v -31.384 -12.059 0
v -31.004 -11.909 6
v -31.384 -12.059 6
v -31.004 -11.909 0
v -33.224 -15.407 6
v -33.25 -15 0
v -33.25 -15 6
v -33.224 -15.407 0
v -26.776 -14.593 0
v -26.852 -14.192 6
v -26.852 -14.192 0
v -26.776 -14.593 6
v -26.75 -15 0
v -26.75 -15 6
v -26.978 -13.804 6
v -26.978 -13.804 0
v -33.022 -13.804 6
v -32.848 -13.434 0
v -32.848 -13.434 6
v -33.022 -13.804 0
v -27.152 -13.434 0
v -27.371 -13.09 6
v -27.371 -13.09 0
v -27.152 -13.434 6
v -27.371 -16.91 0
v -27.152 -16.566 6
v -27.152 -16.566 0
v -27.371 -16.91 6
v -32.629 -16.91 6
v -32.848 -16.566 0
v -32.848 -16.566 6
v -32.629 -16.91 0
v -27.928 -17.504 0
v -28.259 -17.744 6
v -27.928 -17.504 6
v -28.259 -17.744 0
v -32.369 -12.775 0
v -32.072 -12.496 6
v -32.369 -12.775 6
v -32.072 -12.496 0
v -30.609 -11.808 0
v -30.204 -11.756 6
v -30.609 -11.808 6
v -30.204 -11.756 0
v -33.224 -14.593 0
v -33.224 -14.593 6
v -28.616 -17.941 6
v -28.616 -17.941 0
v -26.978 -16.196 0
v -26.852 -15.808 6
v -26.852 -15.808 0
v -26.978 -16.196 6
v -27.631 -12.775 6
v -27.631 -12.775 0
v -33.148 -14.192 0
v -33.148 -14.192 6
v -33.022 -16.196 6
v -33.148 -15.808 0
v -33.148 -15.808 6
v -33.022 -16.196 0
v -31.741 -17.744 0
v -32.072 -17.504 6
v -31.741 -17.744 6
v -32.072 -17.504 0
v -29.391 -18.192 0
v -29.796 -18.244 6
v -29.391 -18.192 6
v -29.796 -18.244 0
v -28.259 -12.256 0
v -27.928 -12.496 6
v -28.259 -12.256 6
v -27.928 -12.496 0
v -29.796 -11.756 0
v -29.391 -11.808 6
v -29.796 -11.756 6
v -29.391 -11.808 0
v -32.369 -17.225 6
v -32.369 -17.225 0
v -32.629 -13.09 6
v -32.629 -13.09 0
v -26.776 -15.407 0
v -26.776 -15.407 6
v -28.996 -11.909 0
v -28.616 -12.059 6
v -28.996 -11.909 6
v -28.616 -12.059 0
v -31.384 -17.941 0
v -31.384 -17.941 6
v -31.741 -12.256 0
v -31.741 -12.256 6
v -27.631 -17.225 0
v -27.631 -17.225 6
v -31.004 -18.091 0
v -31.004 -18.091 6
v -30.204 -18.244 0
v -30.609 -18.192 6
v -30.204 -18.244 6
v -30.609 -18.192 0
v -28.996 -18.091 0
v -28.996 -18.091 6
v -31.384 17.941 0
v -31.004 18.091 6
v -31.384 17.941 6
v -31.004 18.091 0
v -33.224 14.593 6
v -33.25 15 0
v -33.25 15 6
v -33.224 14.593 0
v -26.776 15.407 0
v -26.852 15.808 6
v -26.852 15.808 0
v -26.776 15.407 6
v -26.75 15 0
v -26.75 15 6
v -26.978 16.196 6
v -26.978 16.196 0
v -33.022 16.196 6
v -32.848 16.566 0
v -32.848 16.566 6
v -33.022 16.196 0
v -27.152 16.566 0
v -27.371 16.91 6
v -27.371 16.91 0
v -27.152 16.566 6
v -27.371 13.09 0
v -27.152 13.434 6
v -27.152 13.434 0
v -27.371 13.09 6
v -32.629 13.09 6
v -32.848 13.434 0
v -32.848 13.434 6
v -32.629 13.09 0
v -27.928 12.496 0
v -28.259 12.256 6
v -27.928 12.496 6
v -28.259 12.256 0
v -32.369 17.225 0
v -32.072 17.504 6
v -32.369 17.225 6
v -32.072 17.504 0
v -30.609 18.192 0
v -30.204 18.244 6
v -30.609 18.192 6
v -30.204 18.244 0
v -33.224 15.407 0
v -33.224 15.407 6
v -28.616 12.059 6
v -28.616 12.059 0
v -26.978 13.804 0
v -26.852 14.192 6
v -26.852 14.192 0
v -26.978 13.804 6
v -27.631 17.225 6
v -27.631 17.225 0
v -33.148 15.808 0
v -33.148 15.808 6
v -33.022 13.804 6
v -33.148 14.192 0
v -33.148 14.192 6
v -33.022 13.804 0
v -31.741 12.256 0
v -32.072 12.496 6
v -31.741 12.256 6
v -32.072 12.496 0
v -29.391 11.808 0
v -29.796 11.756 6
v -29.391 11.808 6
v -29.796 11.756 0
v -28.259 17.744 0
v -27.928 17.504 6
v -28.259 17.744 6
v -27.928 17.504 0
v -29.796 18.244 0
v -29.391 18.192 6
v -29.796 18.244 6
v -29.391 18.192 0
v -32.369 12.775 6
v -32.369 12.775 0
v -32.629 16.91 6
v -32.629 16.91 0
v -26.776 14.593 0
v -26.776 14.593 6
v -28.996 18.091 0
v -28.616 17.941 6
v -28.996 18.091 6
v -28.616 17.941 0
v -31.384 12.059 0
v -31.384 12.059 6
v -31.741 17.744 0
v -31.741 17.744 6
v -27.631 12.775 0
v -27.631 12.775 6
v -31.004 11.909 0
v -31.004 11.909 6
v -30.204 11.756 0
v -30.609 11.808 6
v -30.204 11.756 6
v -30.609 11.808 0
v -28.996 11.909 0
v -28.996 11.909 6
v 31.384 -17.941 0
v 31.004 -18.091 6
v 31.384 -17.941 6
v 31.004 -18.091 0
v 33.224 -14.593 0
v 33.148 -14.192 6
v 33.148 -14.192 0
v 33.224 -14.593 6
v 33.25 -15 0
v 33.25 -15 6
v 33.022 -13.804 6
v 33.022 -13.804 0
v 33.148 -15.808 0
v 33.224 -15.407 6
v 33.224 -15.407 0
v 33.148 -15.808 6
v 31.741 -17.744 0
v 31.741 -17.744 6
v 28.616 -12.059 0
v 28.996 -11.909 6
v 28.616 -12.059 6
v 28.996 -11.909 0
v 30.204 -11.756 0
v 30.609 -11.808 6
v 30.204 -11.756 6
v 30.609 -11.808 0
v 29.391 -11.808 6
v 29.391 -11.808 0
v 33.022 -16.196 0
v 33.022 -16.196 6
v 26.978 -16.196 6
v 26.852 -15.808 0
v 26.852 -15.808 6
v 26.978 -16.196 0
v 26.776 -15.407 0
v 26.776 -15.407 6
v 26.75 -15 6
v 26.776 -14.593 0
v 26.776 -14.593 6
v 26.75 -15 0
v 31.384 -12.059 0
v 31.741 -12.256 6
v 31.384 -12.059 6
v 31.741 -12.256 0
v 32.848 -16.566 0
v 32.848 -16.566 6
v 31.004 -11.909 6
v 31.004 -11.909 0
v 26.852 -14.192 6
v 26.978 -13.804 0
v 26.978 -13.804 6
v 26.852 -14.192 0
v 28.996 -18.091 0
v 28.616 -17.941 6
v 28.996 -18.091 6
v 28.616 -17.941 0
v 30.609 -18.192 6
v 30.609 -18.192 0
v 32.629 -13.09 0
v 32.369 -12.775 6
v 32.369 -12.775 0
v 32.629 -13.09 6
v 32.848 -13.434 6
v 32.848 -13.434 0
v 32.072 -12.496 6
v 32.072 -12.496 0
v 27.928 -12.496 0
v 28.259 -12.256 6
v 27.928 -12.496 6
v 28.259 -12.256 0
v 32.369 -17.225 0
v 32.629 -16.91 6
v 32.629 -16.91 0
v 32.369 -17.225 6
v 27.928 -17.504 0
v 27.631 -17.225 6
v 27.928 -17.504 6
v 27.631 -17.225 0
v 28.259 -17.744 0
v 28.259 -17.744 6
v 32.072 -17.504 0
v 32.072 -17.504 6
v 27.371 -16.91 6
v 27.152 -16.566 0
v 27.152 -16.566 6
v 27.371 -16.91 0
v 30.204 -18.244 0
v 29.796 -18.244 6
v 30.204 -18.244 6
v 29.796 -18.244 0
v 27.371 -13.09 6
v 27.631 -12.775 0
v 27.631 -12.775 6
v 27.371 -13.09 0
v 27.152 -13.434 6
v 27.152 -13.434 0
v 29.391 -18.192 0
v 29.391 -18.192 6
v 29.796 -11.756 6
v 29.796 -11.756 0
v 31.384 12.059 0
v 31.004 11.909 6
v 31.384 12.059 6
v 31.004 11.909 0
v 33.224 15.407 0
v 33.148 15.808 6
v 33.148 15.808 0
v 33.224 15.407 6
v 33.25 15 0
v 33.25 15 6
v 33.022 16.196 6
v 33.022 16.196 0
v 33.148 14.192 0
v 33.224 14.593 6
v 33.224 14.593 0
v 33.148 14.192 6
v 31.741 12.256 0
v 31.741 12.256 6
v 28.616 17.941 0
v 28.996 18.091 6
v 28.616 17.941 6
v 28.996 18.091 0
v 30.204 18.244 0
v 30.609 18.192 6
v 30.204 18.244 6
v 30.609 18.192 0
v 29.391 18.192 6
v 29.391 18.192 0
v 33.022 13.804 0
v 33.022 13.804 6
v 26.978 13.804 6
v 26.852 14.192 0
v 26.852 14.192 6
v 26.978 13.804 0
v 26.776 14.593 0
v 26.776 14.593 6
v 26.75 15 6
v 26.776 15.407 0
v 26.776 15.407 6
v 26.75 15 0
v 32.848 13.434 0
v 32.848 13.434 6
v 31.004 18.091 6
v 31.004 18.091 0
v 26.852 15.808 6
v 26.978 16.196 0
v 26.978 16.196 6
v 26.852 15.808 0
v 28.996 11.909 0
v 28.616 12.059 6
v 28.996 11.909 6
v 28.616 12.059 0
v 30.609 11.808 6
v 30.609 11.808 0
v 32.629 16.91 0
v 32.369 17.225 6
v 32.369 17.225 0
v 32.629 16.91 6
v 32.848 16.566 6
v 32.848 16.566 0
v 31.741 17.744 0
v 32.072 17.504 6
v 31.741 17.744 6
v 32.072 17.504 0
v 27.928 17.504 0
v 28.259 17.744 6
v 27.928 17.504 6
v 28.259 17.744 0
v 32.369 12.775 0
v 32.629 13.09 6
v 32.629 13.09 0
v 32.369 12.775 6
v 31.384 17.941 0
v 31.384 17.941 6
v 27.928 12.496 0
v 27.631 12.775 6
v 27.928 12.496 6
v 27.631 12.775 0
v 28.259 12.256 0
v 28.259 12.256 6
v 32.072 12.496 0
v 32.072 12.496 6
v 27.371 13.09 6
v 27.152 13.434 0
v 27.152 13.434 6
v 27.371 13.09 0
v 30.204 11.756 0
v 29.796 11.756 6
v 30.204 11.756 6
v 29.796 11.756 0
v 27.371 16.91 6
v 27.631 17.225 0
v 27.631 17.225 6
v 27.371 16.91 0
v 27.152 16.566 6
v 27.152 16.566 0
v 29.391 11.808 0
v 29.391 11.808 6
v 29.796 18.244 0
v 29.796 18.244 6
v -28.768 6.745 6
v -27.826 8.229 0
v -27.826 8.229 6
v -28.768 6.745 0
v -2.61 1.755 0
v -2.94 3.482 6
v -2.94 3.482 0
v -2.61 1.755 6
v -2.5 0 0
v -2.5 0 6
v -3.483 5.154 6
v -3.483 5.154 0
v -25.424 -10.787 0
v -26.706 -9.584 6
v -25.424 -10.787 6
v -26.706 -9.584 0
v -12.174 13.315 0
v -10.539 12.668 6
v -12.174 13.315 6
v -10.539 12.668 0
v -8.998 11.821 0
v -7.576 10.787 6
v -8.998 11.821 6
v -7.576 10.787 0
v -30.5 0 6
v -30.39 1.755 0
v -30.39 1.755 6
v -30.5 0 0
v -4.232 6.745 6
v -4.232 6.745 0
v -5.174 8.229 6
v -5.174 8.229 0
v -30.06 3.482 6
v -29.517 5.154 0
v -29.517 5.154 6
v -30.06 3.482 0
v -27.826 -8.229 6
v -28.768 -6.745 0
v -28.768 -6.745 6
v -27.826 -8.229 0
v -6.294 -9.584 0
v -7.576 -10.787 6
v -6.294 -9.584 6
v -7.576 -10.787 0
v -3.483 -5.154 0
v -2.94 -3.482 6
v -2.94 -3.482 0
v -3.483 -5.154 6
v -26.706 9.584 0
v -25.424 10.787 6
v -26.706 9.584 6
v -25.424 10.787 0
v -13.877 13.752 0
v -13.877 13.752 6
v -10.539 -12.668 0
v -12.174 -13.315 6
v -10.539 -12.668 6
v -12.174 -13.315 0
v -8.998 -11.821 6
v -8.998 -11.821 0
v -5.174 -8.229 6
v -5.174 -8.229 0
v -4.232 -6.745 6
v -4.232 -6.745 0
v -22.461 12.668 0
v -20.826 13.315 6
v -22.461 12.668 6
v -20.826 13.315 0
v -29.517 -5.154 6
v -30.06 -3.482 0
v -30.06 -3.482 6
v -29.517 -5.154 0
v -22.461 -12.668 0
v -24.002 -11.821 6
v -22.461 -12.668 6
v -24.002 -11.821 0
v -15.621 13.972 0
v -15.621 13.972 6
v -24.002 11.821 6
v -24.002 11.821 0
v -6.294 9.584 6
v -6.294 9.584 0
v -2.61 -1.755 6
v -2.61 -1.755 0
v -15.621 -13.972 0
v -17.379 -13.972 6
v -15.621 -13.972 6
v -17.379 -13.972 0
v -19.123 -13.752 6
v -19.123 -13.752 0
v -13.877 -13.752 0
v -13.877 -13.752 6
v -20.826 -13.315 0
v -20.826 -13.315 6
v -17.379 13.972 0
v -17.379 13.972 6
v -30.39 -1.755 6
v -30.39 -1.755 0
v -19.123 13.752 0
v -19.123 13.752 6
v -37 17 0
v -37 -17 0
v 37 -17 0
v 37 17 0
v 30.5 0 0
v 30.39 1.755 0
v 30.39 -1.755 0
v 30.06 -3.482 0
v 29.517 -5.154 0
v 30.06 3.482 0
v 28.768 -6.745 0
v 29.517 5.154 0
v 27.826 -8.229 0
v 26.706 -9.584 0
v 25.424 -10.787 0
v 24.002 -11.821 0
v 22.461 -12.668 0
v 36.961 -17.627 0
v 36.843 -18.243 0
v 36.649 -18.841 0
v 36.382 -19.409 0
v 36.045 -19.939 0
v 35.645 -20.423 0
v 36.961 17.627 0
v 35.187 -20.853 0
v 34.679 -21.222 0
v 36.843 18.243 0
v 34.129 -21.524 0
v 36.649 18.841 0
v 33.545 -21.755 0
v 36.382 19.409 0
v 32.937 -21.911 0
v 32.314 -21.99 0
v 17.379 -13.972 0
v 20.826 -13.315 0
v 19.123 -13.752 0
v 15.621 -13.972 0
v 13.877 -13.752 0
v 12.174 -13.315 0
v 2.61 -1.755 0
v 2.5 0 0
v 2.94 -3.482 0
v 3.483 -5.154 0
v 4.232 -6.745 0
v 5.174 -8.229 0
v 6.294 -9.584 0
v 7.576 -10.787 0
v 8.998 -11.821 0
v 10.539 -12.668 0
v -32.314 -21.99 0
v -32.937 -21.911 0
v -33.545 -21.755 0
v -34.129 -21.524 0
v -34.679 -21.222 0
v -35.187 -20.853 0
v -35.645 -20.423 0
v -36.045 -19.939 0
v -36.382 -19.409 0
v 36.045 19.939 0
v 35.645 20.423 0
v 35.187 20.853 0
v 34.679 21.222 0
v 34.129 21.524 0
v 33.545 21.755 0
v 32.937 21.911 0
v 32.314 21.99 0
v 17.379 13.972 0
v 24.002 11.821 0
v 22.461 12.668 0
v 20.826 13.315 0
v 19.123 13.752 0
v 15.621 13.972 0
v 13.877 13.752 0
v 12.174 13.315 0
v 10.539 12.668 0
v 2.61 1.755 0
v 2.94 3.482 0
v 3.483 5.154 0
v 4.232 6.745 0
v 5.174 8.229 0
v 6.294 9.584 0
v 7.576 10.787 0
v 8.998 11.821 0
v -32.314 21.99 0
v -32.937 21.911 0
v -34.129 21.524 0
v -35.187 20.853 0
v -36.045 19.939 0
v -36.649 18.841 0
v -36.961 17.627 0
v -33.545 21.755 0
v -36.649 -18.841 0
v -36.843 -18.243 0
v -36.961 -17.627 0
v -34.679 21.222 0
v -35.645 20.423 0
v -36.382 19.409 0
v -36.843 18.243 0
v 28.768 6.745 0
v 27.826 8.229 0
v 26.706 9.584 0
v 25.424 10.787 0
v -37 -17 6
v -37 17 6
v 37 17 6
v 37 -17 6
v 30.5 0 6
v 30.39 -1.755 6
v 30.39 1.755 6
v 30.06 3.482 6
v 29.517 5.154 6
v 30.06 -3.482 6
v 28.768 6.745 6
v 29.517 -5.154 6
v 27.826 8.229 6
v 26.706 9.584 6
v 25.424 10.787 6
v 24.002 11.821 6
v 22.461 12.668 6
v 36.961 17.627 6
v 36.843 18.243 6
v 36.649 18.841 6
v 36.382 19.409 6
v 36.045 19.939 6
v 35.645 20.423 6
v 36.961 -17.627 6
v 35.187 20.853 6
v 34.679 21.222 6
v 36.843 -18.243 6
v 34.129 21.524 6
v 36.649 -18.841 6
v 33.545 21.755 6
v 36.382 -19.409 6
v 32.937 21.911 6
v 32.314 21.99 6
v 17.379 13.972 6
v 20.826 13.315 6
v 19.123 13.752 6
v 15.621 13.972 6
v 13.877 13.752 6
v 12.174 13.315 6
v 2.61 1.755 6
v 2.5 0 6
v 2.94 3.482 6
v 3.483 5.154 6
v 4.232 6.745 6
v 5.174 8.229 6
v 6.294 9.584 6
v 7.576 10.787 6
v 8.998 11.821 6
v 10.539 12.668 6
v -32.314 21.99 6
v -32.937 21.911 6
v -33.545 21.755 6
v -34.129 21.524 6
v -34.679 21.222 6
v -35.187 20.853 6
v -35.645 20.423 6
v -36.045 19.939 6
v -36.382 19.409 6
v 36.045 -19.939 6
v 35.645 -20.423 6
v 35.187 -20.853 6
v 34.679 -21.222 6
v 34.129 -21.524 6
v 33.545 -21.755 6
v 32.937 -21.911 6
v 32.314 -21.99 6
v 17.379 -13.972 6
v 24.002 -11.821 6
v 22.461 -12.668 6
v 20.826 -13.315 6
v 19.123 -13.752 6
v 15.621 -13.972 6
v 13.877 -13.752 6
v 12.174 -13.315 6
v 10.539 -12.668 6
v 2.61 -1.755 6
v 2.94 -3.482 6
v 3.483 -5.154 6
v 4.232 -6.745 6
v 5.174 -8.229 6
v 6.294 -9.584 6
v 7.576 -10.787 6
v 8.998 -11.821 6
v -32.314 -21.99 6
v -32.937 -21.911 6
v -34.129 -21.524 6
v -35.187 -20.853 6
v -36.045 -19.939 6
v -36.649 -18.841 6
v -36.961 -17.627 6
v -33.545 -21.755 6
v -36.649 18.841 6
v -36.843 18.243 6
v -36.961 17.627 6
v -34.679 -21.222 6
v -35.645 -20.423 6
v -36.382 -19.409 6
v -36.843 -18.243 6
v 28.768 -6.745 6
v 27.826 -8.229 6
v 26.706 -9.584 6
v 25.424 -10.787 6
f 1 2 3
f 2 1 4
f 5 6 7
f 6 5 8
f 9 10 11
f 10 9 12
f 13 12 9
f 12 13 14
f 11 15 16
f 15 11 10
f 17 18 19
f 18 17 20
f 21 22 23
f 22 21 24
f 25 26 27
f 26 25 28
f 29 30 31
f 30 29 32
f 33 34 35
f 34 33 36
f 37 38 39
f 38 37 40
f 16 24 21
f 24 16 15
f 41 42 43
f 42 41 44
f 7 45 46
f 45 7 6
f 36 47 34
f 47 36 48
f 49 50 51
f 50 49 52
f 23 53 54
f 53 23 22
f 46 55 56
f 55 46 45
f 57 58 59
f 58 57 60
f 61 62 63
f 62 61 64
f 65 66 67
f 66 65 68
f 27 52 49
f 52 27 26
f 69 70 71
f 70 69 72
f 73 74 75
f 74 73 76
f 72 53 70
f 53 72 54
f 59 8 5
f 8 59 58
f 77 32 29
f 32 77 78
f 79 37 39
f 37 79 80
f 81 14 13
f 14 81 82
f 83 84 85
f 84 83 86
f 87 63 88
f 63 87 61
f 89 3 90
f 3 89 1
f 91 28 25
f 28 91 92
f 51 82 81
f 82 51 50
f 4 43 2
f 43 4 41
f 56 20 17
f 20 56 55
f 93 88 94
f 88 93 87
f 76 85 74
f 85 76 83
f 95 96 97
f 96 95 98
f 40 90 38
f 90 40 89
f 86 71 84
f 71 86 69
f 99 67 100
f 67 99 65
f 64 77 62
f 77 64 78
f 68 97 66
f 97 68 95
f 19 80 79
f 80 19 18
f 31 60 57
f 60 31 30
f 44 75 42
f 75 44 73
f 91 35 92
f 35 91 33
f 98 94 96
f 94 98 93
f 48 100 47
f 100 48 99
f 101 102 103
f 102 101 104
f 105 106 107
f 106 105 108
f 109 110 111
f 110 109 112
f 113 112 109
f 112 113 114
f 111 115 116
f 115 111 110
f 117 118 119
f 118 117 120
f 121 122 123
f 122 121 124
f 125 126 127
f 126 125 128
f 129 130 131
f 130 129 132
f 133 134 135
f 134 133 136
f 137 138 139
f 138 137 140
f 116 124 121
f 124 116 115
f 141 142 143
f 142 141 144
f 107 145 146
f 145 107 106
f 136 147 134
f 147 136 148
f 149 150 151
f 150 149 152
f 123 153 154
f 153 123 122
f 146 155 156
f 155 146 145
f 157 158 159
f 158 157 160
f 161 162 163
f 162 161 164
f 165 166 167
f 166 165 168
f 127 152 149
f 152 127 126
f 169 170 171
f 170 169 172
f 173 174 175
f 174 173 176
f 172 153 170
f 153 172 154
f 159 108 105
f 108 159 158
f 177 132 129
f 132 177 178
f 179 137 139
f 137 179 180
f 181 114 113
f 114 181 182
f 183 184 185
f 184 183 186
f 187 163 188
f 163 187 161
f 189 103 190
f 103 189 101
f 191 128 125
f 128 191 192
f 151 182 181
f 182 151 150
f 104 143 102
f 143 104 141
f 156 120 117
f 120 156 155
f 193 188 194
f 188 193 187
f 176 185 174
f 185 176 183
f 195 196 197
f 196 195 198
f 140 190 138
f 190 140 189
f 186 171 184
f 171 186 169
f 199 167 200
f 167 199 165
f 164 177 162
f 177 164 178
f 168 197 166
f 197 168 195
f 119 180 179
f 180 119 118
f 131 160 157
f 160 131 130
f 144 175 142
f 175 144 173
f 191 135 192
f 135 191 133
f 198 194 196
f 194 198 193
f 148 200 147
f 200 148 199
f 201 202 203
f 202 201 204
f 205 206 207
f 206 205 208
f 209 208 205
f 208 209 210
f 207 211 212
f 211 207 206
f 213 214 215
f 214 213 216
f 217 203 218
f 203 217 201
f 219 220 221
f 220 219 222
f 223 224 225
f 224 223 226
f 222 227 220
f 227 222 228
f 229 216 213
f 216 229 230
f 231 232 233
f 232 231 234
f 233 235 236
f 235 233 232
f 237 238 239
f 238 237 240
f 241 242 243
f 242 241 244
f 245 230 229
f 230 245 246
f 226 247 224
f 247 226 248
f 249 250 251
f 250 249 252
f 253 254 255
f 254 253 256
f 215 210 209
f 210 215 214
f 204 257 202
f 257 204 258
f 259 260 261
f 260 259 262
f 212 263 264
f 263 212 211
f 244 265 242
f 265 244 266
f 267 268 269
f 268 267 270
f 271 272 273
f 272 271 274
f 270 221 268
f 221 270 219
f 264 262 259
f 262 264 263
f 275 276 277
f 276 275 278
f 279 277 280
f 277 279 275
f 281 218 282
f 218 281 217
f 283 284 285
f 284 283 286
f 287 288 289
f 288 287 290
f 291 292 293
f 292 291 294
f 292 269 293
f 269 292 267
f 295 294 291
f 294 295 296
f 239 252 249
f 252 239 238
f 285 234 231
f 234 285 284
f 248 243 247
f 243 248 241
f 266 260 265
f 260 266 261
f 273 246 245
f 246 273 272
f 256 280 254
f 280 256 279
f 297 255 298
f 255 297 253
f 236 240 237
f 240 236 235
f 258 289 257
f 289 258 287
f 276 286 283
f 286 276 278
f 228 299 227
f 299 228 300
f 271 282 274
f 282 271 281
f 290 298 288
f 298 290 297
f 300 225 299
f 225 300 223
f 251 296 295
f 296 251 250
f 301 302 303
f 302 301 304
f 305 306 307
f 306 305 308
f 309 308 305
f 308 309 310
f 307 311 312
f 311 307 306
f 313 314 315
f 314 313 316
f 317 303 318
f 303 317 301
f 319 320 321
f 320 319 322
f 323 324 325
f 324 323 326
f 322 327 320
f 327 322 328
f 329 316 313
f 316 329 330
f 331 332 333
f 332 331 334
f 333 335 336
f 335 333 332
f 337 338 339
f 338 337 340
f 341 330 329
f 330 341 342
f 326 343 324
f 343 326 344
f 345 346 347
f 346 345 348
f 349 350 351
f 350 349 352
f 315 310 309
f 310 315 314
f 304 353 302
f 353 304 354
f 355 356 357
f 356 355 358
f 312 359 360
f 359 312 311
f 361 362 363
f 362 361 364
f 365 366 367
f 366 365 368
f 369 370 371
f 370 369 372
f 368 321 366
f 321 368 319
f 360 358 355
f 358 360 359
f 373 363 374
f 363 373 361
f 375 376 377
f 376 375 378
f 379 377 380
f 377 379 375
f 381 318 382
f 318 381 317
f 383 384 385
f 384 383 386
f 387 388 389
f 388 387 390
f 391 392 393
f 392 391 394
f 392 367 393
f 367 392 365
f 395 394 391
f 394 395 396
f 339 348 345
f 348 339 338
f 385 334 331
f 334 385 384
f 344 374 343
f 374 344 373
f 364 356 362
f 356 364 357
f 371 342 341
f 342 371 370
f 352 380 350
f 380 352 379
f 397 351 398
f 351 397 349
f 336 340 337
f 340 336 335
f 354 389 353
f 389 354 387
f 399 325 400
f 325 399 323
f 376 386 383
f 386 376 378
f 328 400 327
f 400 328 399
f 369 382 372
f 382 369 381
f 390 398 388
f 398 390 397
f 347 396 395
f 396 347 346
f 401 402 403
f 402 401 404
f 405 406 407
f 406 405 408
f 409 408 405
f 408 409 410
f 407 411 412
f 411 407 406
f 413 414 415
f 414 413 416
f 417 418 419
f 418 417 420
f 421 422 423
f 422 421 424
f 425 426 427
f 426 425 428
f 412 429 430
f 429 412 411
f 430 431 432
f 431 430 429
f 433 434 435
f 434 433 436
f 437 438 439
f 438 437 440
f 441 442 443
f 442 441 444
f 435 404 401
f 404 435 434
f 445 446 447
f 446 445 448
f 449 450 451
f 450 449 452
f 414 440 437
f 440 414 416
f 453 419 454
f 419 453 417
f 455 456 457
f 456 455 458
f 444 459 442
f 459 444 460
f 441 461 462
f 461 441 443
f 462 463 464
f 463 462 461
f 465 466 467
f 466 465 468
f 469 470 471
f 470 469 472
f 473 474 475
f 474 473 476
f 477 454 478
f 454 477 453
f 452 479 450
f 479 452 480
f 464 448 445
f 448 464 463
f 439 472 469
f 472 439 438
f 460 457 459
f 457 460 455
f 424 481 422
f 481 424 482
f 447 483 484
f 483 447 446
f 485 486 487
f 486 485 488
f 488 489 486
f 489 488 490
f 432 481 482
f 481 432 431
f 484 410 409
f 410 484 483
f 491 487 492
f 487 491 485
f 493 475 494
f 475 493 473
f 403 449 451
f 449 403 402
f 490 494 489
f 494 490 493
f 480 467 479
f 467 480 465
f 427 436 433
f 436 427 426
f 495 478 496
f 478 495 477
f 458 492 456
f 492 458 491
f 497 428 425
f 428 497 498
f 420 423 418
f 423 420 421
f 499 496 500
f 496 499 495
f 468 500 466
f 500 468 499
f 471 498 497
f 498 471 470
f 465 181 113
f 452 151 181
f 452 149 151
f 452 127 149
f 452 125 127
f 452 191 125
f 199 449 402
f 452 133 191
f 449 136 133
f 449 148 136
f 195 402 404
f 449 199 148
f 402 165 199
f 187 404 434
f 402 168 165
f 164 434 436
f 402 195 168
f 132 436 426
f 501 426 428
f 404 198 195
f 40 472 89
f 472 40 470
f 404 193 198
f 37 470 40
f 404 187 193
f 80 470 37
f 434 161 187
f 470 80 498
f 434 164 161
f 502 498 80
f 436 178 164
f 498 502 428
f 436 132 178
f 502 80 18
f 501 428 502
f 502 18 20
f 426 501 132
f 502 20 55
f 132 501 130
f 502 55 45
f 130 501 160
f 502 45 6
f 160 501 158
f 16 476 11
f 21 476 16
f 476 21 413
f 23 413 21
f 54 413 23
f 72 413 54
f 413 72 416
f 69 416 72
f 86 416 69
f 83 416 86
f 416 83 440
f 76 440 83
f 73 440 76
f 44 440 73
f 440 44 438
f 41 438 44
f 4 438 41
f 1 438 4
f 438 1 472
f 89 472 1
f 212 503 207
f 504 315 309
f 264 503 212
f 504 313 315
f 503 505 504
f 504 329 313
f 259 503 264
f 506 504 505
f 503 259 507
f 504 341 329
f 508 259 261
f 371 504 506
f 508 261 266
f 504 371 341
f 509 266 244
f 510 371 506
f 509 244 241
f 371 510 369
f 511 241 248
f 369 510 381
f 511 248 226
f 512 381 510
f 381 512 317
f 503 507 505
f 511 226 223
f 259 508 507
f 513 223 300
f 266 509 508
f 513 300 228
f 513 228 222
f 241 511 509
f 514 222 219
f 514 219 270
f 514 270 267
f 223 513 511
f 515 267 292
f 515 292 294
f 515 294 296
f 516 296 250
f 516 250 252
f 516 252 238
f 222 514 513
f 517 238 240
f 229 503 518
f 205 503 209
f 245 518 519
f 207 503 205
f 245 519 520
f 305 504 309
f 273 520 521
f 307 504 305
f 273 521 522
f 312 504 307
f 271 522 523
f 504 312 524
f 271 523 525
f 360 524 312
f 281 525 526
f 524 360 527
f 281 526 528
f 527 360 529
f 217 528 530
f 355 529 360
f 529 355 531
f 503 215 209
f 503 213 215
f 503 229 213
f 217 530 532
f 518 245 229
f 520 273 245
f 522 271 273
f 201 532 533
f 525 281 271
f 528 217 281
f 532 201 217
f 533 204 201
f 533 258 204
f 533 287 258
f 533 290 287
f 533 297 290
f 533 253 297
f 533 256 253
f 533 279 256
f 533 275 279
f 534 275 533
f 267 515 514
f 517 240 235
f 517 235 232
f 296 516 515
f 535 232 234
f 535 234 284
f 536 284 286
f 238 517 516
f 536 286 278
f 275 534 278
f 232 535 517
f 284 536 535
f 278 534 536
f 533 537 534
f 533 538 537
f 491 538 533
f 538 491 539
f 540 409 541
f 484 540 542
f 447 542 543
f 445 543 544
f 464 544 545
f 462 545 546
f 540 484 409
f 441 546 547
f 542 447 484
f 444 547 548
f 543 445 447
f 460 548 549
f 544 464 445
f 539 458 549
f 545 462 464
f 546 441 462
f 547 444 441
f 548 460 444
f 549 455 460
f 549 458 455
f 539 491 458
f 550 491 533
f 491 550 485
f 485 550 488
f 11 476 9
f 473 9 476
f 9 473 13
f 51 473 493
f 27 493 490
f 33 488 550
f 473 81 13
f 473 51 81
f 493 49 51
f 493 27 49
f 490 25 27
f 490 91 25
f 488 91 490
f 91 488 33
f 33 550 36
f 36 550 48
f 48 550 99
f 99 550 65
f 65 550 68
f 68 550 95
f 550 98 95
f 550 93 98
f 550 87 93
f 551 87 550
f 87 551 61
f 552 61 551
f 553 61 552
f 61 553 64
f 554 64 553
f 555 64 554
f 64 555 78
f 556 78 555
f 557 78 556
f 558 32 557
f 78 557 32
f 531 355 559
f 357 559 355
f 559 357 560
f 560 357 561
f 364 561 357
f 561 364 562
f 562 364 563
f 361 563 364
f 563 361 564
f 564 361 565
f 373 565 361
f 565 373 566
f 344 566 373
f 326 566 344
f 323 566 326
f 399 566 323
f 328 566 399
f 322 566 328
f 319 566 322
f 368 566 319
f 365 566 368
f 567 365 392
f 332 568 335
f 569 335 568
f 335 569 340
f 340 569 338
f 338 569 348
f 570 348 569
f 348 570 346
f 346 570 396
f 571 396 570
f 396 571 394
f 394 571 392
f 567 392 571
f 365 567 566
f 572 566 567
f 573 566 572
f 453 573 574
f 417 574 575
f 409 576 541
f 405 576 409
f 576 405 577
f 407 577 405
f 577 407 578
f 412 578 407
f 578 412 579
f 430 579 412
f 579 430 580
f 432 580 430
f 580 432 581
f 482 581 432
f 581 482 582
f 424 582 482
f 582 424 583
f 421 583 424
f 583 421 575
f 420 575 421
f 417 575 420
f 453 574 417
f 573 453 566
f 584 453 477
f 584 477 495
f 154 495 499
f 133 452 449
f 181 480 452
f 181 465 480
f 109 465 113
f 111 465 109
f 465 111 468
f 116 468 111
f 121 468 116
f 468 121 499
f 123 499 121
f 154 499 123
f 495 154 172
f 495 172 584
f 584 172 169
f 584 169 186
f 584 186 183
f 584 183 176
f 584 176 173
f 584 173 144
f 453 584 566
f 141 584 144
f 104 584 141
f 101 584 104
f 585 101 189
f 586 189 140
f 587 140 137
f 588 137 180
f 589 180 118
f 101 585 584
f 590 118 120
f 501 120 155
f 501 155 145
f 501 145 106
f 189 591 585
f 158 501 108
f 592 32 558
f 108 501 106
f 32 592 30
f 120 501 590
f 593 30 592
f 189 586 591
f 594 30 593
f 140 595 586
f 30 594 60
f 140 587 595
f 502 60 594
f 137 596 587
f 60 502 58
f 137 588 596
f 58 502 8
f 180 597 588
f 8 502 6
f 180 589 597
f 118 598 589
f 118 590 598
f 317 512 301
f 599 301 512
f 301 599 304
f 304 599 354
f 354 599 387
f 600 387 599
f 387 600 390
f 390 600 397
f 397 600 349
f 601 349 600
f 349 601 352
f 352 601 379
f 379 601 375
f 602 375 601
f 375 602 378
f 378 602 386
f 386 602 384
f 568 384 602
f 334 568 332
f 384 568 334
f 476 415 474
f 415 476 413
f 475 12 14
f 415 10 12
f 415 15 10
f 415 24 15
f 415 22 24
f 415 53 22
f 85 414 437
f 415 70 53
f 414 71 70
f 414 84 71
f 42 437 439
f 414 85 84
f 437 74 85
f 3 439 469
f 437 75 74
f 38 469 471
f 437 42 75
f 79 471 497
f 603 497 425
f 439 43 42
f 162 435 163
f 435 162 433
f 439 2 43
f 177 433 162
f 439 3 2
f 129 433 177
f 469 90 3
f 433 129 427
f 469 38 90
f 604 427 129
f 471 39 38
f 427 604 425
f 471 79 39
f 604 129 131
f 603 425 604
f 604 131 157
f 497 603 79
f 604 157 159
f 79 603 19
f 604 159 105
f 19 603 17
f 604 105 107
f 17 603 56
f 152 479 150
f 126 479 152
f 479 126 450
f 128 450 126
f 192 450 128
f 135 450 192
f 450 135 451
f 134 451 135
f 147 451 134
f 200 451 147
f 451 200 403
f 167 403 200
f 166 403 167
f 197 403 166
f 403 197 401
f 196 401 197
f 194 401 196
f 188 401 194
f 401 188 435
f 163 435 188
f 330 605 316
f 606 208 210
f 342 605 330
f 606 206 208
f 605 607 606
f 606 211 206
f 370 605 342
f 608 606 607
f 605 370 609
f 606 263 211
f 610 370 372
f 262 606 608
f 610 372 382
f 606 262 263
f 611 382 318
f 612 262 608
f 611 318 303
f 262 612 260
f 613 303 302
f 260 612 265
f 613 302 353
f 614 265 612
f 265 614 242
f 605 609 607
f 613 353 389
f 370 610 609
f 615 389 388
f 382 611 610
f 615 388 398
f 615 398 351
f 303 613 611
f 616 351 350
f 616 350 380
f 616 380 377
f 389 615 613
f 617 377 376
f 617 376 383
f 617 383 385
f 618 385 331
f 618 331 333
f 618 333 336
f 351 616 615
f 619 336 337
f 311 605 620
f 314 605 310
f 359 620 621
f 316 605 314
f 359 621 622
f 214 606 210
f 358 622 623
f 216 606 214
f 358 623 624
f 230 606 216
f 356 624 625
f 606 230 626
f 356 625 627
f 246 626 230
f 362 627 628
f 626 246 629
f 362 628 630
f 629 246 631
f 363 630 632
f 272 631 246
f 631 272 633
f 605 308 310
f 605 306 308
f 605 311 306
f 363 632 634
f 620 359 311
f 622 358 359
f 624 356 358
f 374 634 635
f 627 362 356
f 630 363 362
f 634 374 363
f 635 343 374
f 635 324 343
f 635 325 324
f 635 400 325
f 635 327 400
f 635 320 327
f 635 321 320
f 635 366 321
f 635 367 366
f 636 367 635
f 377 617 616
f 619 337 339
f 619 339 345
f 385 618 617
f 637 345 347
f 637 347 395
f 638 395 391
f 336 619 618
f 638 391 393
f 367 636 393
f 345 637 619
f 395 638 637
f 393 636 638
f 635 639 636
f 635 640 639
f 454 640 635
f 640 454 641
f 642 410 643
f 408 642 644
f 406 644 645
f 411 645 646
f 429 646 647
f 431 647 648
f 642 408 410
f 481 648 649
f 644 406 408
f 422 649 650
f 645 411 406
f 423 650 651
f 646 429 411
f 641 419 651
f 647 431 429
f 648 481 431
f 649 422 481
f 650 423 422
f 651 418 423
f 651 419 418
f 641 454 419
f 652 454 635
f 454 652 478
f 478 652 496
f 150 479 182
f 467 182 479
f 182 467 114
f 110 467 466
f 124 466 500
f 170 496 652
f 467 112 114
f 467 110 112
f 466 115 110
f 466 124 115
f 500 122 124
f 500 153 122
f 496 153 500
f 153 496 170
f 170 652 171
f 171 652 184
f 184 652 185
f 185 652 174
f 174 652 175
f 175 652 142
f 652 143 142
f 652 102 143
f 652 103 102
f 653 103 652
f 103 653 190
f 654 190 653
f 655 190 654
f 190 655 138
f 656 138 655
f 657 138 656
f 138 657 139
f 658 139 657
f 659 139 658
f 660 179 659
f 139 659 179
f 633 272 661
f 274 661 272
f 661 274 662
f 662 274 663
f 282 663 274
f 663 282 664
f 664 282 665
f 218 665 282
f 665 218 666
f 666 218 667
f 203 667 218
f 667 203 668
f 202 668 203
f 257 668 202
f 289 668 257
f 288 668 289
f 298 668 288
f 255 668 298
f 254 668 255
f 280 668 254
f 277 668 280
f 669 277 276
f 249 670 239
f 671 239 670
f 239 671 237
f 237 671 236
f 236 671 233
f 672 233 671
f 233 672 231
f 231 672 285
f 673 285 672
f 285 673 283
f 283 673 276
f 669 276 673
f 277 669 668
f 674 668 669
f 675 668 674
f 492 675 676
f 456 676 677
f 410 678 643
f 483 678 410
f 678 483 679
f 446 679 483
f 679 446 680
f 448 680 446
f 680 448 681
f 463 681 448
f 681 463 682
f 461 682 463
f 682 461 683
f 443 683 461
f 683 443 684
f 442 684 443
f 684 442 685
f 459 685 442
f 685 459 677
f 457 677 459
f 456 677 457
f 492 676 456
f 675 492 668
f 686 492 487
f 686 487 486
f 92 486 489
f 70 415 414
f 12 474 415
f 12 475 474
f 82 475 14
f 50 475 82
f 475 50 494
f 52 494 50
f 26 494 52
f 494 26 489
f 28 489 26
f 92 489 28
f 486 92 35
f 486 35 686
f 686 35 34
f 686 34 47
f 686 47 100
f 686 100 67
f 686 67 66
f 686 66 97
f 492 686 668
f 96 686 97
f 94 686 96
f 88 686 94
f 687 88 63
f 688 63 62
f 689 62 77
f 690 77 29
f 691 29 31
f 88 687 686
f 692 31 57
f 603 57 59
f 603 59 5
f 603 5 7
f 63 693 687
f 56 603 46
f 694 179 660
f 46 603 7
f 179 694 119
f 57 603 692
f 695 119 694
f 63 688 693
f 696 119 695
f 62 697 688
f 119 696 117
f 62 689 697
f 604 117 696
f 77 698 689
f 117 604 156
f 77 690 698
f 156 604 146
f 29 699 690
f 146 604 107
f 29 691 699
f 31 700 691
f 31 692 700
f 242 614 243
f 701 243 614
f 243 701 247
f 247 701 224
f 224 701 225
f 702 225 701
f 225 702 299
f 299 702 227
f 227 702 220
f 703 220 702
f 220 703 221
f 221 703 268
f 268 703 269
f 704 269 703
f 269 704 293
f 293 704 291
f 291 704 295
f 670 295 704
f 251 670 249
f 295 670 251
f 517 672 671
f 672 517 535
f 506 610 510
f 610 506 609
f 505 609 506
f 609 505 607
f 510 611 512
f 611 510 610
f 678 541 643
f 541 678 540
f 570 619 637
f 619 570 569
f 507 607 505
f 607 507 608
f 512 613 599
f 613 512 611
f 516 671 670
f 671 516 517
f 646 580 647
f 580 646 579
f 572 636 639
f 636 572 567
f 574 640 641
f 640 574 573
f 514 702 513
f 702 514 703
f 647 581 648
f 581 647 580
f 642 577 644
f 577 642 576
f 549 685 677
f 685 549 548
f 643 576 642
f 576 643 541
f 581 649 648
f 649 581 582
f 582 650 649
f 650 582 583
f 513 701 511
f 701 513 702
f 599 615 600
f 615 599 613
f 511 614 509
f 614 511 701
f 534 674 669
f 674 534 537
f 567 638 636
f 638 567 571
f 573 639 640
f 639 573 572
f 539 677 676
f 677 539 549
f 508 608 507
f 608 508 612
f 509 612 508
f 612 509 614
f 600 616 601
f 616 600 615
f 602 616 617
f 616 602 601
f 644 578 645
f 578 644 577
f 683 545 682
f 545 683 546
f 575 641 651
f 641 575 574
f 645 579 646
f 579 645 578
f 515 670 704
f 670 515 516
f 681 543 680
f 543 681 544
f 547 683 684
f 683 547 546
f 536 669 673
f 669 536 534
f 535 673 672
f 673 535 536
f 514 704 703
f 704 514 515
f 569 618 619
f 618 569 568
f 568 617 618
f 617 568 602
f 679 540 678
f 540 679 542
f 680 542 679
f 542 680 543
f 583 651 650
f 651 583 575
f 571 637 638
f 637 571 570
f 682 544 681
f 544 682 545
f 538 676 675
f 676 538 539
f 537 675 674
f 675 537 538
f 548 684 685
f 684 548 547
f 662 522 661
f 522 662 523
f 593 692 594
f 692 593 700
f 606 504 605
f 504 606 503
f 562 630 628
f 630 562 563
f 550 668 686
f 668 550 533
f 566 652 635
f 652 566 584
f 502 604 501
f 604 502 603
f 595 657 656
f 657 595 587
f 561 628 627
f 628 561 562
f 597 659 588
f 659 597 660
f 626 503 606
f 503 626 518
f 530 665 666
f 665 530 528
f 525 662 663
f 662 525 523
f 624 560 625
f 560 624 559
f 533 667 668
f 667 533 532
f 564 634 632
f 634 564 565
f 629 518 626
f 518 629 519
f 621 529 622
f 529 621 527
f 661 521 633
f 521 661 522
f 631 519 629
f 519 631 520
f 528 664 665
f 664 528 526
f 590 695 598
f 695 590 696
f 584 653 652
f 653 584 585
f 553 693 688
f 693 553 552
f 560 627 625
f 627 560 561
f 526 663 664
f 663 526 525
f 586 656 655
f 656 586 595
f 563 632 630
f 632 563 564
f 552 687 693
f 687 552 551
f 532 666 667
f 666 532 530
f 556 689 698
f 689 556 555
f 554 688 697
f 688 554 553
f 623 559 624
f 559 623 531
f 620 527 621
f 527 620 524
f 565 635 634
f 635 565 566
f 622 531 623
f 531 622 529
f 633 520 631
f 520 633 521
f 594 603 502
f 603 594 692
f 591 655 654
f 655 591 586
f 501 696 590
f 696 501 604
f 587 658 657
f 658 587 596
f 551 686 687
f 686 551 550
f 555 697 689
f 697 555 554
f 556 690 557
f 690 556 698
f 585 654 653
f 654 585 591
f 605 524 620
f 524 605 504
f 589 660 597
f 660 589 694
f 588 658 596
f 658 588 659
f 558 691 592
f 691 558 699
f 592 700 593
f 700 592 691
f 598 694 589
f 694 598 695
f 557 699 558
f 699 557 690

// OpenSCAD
$fn = 50;


difference() {
	union() {
		hull() {
			translate(v = [-32.0000000000, 17.0000000000, 0]) {
				cylinder(h = 6, r = 5);
			}
			translate(v = [32.0000000000, 17.0000000000, 0]) {
				cylinder(h = 6, r = 5);
			}
			translate(v = [-32.0000000000, -17.0000000000, 0]) {
				cylinder(h = 6, r = 5);
			}
			translate(v = [32.0000000000, -17.0000000000, 0]) {
				cylinder(h = 6, r = 5);
			}
		}
	}
	union() {
		#translate(v = [-30.0000000000, -15.0000000000, -100.0000000000]) {
			cylinder(h = 200, r = 3.2500000000);
		}
		#translate(v = [-30.0000000000, 15.0000000000, -100.0000000000]) {
			cylinder(h = 200, r = 3.2500000000);
		}
		#translate(v = [30.0000000000, -15.0000000000, -100.0000000000]) {
			cylinder(h = 200, r = 3.2500000000);
		}
		#translate(v = [30.0000000000, 15.0000000000, -100.0000000000]) {
			cylinder(h = 200, r = 3.2500000000);
		}
		#translate(v = [-16.5000000000, 0, 0]) {
			cylinder(h = 6, r = 14.0000000000);
		}
		#translate(v = [16.5000000000, 0, 0]) {
			cylinder(h = 6, r = 14.0000000000);
		}
	}
}
